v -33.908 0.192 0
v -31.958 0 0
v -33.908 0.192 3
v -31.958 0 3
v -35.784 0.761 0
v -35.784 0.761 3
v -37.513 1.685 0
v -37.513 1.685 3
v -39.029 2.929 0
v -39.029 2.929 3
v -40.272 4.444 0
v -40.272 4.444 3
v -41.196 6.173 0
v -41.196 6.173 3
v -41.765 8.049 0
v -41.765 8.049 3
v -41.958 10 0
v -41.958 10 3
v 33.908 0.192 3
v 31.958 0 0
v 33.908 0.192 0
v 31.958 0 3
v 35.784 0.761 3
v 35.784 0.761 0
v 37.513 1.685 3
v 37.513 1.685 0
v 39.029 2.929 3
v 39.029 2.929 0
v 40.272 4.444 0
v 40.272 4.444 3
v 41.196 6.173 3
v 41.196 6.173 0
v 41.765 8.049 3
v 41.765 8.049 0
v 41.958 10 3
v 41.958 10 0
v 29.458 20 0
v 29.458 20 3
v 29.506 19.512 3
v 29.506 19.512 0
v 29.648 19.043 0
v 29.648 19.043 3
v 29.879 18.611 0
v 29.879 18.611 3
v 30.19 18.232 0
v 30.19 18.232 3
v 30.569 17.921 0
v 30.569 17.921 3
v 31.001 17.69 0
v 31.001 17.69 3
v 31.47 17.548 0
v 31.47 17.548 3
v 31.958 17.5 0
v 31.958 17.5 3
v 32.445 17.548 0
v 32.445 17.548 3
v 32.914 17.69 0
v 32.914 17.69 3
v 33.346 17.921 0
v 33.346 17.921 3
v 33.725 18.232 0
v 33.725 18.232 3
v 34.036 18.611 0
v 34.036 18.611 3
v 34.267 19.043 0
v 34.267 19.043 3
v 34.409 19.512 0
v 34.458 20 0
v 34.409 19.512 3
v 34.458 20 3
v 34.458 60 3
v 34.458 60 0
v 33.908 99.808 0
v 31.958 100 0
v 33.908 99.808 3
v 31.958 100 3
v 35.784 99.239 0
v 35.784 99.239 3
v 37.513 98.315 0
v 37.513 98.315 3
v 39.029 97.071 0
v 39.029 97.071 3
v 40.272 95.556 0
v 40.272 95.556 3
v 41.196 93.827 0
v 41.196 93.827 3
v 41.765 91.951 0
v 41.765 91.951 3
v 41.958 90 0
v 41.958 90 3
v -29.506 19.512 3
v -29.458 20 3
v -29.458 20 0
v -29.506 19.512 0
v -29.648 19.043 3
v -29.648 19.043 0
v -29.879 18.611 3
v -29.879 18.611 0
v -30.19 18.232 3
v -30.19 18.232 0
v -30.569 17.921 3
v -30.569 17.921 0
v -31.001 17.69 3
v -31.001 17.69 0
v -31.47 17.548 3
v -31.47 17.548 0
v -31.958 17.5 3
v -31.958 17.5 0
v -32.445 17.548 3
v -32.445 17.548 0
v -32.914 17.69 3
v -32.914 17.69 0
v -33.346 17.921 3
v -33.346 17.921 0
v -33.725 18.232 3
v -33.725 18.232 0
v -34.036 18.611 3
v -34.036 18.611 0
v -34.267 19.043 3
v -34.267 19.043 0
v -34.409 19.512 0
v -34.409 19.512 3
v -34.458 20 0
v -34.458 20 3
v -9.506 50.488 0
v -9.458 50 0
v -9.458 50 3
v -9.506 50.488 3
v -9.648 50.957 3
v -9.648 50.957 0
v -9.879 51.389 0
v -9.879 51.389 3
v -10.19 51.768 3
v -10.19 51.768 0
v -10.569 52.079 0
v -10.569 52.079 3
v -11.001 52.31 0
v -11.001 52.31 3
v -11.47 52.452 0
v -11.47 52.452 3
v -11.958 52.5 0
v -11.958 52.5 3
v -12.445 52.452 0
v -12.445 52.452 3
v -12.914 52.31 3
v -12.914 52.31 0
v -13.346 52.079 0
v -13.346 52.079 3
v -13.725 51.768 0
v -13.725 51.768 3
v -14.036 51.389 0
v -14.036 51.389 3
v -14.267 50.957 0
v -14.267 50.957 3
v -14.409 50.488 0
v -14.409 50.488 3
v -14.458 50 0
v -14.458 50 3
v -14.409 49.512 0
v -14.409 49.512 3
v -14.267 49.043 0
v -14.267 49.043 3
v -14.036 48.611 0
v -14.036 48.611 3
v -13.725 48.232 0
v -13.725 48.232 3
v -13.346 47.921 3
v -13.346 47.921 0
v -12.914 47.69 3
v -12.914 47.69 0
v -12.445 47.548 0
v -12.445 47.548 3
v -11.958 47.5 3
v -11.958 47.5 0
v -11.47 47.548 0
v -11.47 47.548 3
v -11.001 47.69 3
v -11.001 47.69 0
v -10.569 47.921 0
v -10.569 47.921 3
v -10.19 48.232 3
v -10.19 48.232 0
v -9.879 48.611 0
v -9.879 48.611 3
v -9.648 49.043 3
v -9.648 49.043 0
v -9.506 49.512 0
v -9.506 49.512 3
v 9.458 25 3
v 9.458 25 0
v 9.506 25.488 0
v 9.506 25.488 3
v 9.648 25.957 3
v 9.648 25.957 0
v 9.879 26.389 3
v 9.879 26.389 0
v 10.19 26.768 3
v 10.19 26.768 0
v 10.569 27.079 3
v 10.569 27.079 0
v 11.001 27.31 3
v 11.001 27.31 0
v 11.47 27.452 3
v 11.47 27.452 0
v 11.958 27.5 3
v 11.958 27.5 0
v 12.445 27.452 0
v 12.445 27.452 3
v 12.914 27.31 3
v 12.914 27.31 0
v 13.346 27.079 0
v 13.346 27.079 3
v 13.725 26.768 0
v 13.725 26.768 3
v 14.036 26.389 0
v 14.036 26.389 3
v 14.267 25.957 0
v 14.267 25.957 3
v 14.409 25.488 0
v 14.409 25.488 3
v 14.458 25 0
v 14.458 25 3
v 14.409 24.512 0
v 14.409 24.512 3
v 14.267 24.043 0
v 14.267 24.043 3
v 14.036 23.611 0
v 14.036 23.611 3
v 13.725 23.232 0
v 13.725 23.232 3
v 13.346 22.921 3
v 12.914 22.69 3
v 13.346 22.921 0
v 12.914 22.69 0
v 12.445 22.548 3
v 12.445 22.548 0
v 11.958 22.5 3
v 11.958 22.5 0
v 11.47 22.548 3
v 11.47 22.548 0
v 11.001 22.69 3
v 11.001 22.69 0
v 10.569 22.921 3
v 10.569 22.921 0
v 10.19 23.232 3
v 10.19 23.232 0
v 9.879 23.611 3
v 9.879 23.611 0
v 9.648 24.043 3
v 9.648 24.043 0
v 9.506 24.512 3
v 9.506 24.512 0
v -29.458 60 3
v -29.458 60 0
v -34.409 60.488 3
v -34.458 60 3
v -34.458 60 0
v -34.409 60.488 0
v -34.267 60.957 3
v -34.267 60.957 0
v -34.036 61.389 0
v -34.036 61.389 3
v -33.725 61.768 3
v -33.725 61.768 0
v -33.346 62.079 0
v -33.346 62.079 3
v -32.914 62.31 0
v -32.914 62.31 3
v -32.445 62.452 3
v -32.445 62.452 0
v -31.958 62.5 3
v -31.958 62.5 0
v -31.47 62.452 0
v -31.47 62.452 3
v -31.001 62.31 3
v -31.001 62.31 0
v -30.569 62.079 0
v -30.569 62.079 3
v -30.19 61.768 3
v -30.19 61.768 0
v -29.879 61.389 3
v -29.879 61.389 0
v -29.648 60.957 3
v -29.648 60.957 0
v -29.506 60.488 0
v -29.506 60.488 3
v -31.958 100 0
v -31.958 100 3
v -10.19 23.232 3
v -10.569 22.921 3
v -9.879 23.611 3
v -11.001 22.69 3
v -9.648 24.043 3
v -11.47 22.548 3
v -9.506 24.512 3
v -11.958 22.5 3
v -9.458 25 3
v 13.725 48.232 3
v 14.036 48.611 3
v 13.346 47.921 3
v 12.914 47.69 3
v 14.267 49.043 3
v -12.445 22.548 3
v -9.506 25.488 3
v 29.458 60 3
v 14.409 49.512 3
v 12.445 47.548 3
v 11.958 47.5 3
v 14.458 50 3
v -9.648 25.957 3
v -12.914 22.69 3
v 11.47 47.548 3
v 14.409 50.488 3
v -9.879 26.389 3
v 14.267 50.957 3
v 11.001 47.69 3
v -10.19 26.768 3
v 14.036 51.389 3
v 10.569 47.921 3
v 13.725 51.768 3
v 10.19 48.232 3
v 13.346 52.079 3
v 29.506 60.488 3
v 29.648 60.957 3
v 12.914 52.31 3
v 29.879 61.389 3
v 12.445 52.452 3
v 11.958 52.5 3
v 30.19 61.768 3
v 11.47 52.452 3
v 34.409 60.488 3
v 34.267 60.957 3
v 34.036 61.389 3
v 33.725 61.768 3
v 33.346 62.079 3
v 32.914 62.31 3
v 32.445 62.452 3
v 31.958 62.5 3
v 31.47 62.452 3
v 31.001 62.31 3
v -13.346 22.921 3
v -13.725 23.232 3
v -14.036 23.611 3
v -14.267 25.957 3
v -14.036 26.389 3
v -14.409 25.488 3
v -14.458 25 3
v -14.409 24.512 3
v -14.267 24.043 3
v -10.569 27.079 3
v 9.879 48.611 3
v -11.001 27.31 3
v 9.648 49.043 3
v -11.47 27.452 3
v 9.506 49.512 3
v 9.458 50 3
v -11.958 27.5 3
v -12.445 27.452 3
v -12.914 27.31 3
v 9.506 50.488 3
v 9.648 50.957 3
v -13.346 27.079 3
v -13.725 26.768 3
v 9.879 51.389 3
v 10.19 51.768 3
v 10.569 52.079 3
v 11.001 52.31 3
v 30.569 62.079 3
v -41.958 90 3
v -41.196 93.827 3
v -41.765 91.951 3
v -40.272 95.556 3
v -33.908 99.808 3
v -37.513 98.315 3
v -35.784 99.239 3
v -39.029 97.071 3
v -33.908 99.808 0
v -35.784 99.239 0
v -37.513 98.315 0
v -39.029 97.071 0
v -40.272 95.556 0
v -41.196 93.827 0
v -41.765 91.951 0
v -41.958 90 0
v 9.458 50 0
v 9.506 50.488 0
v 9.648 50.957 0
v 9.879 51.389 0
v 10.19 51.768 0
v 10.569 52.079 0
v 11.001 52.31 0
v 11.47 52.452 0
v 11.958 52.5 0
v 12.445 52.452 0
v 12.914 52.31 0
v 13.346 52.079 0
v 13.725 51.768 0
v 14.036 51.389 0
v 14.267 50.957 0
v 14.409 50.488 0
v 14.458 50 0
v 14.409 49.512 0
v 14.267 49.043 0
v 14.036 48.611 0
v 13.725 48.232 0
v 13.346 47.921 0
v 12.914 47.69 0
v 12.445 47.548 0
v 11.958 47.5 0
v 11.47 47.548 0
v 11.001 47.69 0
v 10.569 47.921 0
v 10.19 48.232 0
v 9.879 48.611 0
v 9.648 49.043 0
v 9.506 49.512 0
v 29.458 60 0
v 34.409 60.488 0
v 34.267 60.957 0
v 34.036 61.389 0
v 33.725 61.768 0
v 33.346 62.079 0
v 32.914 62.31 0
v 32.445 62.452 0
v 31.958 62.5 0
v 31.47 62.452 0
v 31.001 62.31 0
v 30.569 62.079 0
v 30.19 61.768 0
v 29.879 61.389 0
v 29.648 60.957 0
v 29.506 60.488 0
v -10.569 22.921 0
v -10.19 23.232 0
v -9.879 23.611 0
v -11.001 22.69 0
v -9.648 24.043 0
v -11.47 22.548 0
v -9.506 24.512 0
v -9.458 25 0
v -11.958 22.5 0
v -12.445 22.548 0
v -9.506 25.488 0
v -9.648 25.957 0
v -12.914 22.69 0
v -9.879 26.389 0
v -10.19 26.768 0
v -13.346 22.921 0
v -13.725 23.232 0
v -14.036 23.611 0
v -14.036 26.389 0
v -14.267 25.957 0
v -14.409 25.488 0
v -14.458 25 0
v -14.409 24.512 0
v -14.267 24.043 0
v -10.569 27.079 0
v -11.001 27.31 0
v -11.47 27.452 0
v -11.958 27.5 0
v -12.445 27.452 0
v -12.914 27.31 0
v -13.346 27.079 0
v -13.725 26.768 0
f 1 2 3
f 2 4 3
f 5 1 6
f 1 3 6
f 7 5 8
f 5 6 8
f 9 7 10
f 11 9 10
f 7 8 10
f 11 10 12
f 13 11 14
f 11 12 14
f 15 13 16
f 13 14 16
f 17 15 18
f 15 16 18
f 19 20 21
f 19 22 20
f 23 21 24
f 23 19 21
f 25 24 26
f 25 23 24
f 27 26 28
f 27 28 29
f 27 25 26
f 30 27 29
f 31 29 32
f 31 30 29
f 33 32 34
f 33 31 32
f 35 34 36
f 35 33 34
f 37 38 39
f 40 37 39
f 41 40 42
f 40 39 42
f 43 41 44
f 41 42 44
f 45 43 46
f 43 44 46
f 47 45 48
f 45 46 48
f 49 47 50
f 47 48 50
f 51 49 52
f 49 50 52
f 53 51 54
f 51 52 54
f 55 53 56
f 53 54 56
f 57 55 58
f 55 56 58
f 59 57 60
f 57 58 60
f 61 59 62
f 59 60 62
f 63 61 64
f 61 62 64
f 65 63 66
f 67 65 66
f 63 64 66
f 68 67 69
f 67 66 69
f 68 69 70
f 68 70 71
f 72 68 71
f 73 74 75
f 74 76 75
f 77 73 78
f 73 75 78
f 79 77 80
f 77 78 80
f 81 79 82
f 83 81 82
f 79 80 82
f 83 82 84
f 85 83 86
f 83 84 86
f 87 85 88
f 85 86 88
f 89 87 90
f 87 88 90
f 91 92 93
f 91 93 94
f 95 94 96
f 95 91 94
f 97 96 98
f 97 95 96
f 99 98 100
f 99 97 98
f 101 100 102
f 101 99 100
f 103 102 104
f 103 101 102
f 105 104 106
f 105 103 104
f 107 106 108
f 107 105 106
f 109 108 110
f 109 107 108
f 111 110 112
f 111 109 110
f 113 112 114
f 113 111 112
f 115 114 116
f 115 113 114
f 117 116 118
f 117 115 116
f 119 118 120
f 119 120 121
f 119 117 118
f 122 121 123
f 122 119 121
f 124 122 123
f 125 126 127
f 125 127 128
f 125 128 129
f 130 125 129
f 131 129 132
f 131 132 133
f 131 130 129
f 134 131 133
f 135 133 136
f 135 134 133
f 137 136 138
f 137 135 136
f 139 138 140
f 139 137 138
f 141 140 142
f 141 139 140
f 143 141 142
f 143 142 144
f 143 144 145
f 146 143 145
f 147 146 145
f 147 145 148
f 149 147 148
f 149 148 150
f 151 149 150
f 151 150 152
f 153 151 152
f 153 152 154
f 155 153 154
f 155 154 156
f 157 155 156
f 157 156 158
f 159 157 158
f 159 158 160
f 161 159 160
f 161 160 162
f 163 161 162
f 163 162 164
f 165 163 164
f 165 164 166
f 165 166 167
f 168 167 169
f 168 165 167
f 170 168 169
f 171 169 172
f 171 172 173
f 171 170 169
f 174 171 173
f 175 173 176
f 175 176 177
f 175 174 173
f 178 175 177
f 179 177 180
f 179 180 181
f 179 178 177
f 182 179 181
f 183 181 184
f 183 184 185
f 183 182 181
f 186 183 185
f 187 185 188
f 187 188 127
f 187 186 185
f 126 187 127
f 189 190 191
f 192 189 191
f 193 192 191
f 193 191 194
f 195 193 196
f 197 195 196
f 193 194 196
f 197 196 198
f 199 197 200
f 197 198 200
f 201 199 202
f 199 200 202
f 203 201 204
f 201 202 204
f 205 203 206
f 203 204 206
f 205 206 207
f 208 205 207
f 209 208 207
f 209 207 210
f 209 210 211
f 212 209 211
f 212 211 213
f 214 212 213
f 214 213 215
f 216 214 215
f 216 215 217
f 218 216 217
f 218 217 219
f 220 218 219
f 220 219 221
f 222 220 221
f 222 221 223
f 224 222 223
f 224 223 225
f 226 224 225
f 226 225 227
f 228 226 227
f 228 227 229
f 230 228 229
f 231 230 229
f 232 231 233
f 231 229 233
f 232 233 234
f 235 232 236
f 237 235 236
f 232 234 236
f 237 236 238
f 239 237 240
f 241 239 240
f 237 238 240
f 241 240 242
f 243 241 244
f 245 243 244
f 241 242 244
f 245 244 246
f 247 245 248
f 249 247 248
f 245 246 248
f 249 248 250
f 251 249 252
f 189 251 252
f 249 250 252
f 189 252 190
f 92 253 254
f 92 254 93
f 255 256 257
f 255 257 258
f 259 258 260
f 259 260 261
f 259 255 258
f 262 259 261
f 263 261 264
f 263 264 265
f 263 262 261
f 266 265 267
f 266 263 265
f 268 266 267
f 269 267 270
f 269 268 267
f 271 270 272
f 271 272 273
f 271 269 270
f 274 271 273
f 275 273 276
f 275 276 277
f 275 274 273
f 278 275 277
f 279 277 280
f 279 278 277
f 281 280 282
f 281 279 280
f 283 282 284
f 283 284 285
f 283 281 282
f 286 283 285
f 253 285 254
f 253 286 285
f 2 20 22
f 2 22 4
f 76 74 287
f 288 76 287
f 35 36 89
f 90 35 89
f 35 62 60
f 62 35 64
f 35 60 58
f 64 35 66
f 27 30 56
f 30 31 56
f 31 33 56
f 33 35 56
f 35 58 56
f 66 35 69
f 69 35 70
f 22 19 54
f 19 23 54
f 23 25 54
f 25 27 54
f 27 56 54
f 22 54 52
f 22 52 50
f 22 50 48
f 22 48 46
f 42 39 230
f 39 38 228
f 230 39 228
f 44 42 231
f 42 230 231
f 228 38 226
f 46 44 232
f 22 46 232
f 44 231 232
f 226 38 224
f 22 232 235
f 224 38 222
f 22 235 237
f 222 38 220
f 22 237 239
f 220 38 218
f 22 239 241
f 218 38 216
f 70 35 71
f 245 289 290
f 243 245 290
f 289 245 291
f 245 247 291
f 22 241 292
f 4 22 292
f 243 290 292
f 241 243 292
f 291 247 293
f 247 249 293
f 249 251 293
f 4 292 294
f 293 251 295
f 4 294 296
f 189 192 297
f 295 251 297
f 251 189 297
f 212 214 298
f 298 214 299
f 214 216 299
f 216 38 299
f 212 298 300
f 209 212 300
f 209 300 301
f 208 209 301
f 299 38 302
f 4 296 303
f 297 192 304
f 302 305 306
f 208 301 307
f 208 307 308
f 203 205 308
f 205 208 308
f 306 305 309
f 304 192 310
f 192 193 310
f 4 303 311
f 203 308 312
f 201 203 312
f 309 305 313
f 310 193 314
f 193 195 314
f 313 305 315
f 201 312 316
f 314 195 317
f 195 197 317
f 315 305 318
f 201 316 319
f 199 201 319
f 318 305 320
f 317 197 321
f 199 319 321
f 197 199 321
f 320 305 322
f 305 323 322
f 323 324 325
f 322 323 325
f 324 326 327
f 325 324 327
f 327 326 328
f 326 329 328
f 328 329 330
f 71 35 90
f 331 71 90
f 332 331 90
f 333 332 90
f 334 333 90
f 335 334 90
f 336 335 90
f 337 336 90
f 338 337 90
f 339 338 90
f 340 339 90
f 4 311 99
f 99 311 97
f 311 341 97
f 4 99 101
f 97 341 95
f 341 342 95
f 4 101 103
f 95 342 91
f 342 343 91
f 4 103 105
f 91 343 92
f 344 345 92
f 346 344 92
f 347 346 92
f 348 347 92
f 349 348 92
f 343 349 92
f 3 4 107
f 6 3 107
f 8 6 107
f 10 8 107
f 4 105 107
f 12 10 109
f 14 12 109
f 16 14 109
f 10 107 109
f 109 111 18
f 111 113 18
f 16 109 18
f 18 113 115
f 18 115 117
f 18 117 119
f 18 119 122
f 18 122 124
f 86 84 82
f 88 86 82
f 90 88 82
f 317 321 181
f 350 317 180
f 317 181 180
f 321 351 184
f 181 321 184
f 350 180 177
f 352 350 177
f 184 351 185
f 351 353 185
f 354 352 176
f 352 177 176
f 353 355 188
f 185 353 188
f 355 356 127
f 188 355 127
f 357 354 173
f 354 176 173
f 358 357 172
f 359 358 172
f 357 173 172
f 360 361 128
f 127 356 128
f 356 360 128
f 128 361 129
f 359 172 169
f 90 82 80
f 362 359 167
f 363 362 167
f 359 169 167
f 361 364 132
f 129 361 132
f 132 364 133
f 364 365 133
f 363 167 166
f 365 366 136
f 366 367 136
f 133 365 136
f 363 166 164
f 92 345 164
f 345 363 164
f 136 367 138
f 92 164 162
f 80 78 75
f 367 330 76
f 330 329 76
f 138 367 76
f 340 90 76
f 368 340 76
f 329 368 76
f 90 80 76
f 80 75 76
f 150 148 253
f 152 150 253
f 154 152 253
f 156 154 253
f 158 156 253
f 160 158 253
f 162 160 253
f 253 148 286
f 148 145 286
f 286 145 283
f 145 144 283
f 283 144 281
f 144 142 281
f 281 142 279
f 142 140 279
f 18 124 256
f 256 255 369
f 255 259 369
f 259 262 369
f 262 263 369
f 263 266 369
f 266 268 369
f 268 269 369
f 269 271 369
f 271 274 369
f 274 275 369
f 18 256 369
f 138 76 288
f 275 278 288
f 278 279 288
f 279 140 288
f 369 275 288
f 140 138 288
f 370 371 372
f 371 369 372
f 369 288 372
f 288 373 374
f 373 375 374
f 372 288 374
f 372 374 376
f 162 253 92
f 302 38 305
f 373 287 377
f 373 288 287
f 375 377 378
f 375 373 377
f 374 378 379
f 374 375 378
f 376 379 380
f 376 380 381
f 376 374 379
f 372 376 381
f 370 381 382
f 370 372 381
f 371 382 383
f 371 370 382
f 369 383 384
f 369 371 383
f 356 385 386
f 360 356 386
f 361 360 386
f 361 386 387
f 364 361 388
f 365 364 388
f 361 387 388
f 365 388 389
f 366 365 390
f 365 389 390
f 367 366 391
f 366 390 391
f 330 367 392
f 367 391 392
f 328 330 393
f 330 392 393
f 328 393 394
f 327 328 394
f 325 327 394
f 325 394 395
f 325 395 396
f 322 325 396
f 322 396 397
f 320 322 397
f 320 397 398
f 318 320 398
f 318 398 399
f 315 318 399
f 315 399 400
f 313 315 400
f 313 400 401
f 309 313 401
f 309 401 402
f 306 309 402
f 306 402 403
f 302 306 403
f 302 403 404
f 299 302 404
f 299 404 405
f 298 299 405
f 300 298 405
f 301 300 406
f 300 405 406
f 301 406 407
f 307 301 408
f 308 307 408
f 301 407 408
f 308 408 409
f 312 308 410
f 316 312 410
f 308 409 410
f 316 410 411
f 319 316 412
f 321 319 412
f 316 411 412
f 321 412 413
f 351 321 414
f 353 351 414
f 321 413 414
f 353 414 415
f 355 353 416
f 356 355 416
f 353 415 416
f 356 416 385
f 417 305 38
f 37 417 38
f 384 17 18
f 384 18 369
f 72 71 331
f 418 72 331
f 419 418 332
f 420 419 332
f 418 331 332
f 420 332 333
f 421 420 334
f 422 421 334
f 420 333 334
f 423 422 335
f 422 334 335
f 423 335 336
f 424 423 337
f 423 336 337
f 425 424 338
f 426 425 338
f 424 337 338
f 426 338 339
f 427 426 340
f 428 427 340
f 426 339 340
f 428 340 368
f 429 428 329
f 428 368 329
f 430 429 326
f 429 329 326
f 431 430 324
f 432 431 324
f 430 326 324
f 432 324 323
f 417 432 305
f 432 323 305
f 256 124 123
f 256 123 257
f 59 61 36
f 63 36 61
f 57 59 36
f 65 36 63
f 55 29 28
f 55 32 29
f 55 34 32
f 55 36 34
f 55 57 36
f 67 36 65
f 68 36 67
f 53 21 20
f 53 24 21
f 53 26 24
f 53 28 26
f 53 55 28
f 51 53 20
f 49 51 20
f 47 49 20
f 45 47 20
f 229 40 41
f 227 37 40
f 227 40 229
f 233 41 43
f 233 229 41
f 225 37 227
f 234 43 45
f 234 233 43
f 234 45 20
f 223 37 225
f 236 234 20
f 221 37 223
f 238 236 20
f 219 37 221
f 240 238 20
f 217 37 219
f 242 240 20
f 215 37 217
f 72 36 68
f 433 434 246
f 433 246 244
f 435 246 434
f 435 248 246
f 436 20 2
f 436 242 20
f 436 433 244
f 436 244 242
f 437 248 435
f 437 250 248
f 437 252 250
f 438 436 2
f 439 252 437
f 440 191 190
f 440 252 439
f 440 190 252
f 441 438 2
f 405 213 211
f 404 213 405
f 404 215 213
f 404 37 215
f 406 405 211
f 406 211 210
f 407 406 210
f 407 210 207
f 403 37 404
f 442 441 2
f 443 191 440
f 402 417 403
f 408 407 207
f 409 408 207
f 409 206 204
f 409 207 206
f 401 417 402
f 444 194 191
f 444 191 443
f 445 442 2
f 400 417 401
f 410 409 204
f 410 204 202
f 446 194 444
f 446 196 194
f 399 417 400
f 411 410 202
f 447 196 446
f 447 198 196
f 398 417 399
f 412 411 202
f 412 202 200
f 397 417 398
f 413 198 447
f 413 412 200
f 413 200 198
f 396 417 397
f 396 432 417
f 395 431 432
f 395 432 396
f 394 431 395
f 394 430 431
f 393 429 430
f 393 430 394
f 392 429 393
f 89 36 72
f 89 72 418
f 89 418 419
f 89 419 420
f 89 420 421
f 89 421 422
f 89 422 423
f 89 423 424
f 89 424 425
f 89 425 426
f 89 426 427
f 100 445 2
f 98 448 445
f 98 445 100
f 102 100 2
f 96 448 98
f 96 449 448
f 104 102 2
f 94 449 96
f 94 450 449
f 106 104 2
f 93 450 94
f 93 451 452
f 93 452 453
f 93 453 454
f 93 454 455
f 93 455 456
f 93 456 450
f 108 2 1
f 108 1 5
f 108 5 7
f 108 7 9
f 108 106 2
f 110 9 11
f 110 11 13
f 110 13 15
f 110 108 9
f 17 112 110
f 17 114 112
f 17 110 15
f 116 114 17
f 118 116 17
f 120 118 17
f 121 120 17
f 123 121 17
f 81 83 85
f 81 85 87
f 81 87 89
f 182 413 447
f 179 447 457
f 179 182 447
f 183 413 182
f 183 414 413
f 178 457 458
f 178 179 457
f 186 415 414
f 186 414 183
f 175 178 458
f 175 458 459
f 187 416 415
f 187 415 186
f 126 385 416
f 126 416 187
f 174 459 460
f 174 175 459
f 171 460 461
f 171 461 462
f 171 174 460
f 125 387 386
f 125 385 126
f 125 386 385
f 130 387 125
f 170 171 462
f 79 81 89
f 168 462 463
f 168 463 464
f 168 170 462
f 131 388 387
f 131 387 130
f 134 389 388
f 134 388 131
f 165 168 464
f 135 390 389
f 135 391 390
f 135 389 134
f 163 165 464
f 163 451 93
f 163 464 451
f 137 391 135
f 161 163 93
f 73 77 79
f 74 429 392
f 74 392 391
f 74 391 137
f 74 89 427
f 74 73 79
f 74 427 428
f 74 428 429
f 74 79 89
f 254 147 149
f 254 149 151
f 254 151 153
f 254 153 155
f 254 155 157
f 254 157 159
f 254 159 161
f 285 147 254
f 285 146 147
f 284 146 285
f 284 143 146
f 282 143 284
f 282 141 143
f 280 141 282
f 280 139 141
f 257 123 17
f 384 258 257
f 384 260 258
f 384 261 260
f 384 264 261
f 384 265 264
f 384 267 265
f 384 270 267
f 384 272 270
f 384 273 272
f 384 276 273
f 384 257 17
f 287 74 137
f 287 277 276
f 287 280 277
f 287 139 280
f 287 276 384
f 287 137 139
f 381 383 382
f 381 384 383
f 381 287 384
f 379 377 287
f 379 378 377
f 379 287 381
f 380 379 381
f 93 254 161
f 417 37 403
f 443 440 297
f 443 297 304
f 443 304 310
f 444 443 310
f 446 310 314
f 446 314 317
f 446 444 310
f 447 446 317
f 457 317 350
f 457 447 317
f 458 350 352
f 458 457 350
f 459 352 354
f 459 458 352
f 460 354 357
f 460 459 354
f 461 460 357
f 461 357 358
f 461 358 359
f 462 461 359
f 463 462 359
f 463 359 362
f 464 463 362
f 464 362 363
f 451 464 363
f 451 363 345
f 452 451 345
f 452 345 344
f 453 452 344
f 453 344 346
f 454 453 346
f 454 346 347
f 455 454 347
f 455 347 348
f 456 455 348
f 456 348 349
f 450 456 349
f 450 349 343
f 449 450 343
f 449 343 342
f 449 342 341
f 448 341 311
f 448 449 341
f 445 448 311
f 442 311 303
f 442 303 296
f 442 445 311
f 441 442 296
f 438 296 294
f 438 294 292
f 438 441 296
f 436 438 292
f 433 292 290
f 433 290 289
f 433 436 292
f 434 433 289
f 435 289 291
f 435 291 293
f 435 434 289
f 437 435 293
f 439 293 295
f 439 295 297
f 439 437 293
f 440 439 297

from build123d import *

# Parameters (mm, degrees)
F0_W     = 41.957522
F0_H     = 100
F1_DEPTH = 3
F3_D     = 5
F6_DEPTH = 25
F7_R     = 10


with BuildPart() as f1:
    # F0 (on Top) → F1 (new body)
    with BuildSketch(Plane.XY):
        with Locations((20.978761, 50)):
            Rectangle(F0_W, F0_H)
    extrude(amount=F1_DEPTH)

    # F3 (through all)
    with Locations(Plane.XY.offset(3)):
        with Locations((11.957522, 50), (11.957522, 25)):
            Hole(F3_D / 2)

    # F5 (on face) → F6 (cut)
    with BuildSketch(Plane.XY.offset(3)):
        with BuildLine():
            ThreePointArc((29.457522, 20), (31.957522, 17.5), (34.457522, 20))
            Line((34.457522, 20), (34.457522, 60))
            ThreePointArc((34.457522, 60), (31.957522, 62.5), (29.457522, 60))
            Line((29.457522, 60), (29.457522, 20))
        make_face()
    extrude(amount=-F6_DEPTH, mode=Mode.SUBTRACT)

    # F7
    f7_edges = [f1.edges().sort_by_distance(p)[0] for p in [
        (41.957522, 0, 1.5),
        (41.957522, 100, 1.5),
    ]]
    fillet(f7_edges, radius=F7_R)

    # F8: F1 across plane


with BuildPart() as f1_1:
    add(f1.part)
    add(f1.part.mirror(Plane.YZ))


solid = f1_1.part
